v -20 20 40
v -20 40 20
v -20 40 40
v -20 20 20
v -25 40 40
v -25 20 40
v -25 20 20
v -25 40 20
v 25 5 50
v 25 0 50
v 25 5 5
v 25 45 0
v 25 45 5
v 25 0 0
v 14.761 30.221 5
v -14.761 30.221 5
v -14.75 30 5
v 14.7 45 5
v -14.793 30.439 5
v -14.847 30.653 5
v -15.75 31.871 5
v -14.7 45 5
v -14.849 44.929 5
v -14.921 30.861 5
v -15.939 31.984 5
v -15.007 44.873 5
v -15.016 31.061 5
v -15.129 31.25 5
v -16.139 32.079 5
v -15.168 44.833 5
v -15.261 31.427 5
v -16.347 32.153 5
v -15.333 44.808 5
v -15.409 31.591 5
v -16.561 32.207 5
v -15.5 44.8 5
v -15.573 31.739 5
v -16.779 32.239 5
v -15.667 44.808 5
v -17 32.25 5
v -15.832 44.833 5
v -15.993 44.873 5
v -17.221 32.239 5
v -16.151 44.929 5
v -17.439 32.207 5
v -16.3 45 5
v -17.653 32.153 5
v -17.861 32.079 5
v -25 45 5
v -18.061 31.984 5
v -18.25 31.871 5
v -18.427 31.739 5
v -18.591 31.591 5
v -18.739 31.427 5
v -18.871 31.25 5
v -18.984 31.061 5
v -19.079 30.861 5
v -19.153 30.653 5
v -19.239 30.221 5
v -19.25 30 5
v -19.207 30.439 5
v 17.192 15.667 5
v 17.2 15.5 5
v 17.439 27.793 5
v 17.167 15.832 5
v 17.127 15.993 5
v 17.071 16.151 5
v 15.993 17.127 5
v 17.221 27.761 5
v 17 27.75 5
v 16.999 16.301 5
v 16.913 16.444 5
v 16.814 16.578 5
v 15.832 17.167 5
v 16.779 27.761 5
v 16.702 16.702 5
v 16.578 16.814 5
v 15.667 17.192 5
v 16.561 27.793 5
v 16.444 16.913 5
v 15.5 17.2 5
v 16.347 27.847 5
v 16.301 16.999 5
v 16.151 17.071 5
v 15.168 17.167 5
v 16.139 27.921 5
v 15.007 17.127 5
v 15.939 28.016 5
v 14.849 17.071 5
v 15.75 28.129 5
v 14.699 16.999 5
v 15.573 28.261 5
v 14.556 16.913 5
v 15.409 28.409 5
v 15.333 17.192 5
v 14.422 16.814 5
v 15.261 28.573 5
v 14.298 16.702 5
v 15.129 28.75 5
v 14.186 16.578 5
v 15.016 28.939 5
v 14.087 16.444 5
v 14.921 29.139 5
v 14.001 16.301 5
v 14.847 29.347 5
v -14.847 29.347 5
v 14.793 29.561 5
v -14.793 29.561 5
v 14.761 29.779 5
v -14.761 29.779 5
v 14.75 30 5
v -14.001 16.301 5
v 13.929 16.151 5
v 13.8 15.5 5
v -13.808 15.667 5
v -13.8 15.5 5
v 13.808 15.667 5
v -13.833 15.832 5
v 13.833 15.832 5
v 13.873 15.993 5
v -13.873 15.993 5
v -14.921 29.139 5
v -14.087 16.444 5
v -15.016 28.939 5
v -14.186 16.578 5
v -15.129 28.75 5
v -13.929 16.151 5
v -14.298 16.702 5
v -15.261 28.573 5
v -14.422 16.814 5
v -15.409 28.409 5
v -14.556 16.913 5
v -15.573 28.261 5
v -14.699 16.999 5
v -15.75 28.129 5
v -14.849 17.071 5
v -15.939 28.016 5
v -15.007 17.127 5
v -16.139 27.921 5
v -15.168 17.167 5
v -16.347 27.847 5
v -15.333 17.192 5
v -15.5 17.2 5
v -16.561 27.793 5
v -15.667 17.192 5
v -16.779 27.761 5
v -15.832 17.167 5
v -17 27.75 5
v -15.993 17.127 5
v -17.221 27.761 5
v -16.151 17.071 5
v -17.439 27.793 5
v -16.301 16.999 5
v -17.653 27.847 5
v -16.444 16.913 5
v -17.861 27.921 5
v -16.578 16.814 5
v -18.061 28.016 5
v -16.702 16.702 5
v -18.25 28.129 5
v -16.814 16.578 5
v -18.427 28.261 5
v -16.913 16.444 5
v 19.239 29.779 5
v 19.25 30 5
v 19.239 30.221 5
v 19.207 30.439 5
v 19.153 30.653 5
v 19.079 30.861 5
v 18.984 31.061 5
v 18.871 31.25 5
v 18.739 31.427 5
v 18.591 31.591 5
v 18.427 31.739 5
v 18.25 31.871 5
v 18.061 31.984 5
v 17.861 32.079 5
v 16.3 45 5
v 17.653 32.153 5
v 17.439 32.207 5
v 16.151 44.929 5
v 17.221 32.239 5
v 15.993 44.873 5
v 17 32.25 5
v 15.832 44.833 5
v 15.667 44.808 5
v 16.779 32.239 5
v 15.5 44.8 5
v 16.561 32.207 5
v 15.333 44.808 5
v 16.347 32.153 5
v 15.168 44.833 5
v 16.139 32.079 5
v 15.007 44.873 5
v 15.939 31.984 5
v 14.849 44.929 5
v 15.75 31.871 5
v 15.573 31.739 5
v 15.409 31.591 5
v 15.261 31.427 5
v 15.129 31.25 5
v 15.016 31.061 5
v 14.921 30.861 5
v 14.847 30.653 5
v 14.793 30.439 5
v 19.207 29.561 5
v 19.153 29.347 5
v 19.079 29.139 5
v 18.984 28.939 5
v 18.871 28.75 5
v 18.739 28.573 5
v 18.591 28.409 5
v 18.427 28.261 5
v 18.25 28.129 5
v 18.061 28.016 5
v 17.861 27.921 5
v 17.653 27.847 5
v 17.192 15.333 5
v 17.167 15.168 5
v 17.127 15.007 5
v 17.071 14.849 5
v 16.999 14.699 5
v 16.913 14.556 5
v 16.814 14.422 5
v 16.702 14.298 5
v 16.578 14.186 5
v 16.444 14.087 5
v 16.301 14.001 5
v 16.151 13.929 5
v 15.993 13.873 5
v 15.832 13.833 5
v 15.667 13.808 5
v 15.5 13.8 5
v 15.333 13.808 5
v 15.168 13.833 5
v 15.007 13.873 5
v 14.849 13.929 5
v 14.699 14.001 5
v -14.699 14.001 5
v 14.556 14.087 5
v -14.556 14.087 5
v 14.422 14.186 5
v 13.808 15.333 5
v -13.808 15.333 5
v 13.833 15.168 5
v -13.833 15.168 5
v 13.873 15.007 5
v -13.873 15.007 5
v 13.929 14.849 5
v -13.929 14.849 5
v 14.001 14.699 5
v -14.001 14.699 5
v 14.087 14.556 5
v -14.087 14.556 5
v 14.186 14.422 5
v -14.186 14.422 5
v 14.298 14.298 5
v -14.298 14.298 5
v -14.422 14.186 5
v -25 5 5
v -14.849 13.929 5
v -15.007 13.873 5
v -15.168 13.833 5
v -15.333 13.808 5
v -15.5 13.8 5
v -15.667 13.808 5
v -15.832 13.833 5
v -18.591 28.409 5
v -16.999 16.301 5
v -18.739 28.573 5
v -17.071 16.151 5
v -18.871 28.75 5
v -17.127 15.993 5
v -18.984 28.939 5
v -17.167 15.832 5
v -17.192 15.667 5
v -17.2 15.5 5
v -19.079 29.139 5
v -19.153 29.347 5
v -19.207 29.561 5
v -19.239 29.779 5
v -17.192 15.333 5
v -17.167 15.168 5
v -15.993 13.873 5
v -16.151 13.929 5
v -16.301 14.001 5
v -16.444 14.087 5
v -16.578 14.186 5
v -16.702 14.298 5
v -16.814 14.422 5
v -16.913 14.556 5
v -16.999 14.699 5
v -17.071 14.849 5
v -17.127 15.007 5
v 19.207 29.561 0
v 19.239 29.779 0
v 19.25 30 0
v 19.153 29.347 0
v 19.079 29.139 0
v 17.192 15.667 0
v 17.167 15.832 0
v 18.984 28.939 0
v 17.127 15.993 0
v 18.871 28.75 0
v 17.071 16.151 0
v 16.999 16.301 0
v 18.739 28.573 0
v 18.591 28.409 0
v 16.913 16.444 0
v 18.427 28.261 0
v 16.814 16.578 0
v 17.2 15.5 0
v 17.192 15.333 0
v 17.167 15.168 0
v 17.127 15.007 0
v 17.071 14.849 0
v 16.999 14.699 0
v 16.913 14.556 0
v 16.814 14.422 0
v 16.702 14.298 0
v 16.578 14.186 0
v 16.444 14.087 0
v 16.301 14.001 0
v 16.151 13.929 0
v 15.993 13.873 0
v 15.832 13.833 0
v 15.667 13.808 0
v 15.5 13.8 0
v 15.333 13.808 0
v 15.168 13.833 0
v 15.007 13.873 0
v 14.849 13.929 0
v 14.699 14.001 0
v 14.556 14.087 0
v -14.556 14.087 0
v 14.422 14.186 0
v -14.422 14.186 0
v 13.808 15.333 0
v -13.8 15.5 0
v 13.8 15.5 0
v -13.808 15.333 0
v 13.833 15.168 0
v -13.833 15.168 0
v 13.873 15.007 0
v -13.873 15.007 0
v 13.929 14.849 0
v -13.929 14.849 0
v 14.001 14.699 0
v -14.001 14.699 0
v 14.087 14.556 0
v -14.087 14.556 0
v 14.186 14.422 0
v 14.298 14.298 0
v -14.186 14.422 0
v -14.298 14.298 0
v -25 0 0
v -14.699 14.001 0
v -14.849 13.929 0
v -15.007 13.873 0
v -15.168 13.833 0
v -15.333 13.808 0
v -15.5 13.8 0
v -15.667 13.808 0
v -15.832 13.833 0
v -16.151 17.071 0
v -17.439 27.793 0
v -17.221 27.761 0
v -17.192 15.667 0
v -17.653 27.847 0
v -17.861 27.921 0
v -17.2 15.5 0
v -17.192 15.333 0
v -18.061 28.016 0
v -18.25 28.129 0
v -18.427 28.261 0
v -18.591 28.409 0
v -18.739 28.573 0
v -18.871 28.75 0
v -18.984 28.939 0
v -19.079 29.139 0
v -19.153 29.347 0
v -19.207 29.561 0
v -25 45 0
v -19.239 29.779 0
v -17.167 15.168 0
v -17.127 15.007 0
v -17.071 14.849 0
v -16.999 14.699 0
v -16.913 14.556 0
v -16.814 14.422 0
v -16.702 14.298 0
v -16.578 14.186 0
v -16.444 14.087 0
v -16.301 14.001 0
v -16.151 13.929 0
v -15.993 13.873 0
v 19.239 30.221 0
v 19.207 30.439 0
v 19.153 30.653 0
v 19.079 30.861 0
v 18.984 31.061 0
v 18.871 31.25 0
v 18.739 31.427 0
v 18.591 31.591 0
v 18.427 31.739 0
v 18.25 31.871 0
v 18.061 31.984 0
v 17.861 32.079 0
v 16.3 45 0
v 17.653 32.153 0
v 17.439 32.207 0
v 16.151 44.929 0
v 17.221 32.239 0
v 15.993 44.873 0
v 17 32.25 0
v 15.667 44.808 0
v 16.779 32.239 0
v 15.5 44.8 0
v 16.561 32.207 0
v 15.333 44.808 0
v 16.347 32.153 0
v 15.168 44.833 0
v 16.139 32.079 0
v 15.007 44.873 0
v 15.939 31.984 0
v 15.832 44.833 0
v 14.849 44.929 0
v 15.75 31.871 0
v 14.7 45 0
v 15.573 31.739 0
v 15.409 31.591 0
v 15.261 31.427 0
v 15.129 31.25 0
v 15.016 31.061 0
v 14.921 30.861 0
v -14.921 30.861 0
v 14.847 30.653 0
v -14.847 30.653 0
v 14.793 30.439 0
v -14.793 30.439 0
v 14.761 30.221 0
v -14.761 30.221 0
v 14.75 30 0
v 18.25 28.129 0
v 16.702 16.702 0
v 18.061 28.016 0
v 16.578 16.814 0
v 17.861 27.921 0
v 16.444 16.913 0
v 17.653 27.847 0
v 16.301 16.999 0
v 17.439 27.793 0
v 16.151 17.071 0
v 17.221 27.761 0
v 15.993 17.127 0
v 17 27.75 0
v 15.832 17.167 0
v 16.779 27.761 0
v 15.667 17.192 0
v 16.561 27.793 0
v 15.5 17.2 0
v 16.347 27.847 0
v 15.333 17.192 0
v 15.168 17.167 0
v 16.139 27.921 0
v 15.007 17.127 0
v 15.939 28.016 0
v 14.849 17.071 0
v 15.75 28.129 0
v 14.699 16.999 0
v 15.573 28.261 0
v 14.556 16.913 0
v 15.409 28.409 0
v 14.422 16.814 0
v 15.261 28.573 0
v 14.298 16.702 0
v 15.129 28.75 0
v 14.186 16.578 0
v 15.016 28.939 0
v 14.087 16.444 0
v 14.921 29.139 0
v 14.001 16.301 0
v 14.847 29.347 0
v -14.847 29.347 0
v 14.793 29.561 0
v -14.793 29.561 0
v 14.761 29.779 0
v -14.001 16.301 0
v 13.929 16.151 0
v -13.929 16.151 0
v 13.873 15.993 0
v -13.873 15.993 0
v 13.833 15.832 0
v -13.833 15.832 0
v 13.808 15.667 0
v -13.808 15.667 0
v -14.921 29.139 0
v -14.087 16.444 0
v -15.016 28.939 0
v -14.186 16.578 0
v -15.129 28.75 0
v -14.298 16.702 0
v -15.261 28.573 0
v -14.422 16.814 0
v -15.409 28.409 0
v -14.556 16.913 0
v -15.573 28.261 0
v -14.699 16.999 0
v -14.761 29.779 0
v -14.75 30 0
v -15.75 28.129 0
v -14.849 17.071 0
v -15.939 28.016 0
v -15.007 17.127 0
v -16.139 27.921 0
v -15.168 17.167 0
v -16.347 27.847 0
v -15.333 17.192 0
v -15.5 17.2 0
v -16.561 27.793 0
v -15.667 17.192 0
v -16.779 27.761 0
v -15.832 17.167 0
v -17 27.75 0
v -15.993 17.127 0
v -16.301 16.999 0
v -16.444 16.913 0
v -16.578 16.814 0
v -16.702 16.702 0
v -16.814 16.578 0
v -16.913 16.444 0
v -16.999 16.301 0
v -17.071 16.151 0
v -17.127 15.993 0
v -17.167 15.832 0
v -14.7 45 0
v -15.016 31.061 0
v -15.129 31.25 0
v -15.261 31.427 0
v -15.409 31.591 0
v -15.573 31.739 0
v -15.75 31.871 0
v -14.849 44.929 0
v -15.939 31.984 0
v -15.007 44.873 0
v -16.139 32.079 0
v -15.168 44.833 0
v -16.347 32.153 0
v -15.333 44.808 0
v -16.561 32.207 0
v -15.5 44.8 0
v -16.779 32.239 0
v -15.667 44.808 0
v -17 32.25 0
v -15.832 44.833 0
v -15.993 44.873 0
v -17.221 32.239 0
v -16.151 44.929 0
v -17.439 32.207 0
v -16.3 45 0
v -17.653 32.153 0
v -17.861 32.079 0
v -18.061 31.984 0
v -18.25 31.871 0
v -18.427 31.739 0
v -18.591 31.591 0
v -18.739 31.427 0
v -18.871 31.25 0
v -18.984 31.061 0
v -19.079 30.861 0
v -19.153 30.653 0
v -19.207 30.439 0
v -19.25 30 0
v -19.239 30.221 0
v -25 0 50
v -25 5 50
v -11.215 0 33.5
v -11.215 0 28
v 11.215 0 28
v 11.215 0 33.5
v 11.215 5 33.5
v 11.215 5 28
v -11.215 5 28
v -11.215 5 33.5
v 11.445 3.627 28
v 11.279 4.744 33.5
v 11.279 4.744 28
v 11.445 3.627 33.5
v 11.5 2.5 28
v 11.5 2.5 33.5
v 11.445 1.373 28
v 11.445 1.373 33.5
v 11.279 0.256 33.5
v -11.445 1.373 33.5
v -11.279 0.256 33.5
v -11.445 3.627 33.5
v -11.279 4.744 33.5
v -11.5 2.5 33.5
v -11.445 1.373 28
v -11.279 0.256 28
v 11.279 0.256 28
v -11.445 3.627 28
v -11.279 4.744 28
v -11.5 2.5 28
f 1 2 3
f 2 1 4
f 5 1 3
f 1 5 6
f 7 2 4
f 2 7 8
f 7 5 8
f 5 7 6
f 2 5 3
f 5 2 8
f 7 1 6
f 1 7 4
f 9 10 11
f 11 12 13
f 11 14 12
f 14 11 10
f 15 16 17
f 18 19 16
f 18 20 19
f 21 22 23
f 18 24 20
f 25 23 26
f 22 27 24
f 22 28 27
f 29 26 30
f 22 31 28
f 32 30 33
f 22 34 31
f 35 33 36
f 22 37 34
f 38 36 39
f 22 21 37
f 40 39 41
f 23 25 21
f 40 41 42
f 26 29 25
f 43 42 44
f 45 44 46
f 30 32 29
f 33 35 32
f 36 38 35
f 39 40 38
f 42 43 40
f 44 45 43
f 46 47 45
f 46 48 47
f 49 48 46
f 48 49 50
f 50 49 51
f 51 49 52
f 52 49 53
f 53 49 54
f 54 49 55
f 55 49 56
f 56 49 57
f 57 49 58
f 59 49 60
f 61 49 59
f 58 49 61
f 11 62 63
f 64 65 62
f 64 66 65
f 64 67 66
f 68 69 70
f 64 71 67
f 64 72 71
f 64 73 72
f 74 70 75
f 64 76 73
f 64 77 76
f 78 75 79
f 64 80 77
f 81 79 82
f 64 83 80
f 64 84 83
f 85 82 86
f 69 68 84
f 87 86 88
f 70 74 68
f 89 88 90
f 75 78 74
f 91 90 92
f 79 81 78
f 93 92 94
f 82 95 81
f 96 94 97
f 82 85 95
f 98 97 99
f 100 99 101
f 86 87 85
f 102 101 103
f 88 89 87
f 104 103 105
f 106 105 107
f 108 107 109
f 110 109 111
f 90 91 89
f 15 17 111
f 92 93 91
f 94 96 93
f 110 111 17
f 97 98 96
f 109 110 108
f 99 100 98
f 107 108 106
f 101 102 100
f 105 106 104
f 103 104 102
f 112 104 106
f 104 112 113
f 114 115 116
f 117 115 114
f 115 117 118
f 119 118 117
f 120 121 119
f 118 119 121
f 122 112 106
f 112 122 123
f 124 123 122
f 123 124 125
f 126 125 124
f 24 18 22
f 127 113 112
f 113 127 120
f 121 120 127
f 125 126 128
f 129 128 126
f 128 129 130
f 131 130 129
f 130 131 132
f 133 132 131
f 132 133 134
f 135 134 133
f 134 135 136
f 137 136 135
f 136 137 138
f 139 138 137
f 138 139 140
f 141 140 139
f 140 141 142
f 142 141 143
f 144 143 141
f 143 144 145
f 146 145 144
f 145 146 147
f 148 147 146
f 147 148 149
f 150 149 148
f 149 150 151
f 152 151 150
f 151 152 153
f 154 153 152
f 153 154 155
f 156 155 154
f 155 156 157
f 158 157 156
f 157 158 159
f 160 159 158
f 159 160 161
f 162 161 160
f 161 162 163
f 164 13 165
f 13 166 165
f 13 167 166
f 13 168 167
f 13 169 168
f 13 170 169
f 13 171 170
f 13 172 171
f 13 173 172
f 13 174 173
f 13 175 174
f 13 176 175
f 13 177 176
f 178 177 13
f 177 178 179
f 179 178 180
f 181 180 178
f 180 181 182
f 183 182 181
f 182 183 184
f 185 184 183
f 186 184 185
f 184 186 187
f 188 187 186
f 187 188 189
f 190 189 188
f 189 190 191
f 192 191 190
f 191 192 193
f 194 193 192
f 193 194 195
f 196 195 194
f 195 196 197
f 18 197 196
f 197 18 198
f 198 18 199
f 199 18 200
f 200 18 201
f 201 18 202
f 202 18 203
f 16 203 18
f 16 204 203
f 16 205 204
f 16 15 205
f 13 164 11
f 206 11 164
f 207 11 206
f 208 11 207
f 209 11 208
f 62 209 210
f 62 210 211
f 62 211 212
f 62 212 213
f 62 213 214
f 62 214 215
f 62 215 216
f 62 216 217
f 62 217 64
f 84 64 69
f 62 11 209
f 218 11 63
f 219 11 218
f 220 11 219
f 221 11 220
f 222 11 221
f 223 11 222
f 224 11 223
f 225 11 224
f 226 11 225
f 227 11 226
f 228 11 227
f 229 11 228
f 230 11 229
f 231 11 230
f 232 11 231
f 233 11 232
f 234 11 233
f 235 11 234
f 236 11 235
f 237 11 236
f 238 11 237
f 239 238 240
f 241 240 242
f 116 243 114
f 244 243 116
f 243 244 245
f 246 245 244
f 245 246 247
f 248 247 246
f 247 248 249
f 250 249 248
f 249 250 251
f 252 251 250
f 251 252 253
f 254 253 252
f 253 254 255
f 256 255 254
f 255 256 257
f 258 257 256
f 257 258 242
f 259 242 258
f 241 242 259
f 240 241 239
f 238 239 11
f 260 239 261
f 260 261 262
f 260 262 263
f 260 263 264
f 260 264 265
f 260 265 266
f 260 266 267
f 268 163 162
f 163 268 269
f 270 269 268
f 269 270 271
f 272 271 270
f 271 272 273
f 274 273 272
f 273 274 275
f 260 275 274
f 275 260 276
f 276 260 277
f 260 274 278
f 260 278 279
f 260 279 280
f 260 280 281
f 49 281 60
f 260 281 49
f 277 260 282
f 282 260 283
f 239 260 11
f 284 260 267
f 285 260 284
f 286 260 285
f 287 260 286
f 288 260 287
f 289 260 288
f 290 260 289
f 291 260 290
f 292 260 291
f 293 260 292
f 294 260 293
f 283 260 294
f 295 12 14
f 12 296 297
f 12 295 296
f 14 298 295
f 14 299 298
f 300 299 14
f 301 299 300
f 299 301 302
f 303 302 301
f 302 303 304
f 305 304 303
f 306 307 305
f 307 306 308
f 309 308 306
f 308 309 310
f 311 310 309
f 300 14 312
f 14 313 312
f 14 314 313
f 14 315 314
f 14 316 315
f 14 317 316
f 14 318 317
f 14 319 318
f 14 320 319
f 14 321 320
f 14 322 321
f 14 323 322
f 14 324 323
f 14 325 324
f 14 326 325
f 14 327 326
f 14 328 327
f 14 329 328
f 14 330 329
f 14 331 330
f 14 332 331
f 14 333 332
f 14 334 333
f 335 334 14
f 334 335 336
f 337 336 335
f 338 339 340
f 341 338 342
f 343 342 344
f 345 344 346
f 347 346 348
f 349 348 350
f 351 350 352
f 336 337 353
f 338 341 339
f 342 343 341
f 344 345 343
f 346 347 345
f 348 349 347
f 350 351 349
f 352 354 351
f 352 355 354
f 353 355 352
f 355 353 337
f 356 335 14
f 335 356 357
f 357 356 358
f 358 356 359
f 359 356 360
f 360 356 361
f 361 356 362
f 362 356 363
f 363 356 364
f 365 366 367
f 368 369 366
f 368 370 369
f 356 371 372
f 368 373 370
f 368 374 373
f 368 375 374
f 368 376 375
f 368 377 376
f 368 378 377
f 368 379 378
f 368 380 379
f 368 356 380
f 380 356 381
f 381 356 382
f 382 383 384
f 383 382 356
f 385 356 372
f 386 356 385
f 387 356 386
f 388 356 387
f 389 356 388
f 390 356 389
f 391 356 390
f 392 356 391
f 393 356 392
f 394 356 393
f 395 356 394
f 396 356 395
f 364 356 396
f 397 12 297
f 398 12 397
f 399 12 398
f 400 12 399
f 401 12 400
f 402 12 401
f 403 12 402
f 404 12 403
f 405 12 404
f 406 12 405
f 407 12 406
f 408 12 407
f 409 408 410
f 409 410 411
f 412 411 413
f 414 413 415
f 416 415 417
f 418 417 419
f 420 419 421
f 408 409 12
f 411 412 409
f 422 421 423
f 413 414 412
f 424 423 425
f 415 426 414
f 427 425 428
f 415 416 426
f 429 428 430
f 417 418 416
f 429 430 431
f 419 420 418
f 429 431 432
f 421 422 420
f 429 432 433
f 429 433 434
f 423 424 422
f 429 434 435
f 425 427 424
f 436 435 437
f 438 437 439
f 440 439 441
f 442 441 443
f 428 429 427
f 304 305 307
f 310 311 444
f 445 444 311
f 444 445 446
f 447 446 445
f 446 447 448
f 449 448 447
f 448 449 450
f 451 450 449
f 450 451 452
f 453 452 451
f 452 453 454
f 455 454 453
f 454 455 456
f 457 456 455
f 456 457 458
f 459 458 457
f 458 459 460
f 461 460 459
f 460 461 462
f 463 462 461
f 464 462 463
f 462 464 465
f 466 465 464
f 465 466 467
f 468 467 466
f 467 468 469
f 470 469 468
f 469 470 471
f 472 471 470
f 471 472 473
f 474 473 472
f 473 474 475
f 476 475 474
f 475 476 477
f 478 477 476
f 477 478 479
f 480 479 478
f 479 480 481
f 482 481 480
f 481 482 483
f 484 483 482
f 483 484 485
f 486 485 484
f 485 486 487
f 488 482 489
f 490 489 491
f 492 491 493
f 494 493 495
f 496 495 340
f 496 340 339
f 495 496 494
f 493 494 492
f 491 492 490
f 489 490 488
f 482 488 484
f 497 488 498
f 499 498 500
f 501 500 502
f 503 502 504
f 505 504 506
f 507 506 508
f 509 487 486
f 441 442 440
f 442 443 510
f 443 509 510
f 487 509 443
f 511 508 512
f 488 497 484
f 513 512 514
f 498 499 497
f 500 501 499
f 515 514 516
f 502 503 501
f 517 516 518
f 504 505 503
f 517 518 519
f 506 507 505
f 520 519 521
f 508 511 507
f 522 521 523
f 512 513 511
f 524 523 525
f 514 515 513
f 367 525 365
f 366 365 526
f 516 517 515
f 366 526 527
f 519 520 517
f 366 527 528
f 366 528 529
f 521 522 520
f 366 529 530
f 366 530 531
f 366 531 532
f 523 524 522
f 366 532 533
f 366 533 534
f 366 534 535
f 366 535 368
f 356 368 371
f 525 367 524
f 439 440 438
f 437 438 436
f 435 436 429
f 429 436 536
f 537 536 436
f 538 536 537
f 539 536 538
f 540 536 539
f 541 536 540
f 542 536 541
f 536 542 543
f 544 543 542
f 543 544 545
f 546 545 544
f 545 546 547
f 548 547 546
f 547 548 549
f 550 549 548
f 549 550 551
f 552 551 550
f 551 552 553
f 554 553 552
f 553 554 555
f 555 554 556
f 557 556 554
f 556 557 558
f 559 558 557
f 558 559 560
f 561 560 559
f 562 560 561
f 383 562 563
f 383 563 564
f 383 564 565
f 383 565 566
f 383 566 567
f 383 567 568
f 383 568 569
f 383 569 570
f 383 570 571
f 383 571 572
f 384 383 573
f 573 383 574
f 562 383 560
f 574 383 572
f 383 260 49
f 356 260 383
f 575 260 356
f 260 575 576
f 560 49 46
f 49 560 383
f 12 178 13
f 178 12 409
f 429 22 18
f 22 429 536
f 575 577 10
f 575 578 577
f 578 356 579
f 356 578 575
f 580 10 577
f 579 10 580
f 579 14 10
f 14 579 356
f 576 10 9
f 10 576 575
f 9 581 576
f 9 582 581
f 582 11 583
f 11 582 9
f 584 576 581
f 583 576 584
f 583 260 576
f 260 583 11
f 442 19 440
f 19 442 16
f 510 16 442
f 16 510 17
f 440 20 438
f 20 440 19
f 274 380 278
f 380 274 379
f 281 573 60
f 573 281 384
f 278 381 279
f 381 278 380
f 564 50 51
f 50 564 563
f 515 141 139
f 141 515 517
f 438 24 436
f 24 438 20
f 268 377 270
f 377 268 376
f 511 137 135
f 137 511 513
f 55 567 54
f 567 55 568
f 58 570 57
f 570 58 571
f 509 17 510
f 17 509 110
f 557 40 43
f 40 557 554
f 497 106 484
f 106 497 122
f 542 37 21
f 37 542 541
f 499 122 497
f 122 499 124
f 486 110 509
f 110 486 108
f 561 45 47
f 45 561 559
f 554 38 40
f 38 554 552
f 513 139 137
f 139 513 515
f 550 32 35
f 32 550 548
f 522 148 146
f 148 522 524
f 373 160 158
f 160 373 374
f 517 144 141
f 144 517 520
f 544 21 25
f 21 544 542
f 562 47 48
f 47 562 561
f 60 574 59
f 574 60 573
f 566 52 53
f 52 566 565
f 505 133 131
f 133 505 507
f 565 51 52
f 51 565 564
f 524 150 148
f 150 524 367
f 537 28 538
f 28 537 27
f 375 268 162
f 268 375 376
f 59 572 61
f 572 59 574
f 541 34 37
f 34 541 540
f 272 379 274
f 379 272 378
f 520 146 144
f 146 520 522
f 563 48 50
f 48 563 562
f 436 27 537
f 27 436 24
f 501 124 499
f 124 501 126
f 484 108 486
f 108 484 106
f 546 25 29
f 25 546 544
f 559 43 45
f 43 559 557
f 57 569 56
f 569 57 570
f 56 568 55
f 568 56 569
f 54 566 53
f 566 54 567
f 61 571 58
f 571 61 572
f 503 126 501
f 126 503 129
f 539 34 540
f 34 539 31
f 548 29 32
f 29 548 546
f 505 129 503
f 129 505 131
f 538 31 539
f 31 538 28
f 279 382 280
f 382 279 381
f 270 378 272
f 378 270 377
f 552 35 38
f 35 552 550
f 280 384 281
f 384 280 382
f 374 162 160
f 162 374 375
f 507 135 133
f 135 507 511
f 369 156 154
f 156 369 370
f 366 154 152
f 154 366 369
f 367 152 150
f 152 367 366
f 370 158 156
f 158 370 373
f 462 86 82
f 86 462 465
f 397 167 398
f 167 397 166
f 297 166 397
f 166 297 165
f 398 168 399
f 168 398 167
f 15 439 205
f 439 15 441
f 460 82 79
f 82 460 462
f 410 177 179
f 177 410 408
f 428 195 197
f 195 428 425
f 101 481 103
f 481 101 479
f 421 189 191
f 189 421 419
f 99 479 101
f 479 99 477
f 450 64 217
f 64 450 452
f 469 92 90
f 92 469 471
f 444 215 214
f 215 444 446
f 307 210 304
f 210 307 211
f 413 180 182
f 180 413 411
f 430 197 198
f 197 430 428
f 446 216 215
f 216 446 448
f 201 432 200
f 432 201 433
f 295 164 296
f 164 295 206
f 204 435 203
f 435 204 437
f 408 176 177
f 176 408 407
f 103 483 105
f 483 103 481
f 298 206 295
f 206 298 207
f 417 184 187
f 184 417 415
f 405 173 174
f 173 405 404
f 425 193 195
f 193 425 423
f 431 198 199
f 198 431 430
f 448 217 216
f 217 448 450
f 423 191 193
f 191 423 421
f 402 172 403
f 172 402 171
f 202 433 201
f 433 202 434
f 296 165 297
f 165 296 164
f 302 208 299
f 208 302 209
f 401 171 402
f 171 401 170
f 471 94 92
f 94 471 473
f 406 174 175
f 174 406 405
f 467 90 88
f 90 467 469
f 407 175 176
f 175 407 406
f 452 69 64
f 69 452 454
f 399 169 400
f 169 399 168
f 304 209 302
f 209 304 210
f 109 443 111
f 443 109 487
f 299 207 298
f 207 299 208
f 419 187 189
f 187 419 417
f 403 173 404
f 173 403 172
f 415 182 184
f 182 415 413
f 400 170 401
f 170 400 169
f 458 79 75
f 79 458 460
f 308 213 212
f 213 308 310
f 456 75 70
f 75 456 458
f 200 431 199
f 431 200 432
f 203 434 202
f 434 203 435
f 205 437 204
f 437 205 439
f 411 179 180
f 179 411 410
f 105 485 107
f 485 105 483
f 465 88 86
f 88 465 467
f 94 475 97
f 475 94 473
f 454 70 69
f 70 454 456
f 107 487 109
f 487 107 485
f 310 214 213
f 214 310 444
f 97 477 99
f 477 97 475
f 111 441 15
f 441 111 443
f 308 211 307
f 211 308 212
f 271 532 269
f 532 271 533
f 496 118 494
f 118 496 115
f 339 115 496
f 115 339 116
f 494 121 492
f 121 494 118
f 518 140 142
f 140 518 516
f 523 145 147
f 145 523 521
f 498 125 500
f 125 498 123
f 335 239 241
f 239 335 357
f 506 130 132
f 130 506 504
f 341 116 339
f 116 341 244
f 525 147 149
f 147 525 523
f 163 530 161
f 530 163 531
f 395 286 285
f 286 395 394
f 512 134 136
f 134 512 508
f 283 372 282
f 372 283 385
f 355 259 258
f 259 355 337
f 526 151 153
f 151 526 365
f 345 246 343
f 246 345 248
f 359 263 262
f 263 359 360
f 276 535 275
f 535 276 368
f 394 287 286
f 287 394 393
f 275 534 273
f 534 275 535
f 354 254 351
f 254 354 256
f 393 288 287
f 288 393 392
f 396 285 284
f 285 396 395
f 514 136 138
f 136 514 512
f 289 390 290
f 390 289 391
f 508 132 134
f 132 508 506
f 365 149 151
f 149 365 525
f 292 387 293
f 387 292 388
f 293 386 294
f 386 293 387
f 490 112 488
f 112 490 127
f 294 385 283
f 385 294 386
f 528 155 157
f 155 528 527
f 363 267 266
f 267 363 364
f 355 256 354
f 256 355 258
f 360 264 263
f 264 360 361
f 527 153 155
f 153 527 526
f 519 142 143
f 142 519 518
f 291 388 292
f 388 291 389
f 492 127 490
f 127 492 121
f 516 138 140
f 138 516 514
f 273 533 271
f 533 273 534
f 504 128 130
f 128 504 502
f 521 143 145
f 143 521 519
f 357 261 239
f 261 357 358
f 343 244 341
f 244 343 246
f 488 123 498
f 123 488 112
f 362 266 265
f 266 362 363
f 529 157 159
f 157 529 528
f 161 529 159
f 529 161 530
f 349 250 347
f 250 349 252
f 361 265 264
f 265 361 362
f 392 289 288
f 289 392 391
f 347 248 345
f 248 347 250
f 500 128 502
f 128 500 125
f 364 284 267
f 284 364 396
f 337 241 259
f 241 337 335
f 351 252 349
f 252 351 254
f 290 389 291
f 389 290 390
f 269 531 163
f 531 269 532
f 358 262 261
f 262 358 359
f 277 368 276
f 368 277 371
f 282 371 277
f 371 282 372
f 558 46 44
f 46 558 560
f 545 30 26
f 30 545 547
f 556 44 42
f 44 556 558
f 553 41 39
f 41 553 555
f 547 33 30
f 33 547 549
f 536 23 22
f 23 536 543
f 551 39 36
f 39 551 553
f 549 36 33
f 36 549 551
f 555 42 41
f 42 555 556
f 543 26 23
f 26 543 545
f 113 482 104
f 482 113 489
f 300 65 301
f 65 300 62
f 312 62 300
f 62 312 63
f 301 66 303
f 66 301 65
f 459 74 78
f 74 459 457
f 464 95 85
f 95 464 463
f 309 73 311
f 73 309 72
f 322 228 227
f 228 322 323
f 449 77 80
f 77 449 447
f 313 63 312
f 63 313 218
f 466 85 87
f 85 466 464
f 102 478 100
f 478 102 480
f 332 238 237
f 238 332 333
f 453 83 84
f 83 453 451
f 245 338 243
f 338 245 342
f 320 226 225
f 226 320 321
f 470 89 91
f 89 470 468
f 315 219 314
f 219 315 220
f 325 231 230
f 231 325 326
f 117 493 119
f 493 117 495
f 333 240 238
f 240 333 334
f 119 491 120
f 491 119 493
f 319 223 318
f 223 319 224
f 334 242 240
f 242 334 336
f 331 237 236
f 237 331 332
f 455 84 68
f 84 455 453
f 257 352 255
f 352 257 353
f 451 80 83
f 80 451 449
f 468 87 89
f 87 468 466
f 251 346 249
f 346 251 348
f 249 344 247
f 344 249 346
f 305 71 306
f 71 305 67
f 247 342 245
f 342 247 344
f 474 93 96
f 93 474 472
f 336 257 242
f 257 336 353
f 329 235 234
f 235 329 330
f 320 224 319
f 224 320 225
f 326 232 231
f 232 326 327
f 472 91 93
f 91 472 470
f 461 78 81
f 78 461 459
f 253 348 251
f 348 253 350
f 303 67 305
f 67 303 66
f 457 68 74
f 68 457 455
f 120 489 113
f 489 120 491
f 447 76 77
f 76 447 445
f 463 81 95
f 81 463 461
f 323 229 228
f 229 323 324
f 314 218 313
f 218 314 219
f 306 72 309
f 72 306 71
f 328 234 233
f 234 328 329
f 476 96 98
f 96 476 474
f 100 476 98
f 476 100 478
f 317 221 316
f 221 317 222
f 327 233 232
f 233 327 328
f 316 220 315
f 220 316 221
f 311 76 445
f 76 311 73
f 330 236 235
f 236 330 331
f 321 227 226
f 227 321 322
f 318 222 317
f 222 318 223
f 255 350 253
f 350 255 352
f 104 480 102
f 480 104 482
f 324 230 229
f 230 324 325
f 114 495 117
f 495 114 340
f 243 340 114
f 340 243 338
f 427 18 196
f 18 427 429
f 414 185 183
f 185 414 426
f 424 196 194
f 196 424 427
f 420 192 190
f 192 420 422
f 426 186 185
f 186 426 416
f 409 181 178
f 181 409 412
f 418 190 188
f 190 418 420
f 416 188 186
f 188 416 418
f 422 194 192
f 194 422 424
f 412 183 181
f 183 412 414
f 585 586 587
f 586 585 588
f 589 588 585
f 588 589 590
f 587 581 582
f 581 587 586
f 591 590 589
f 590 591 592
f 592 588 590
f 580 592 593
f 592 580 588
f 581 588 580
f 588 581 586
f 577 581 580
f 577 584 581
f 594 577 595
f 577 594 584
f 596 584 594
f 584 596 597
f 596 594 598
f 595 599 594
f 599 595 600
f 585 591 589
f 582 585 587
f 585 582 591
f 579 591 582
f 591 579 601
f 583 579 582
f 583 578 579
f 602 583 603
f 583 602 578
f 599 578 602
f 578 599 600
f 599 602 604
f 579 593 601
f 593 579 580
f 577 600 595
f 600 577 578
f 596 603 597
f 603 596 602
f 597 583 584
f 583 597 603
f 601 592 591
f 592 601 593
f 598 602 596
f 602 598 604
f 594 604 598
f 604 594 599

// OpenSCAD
// L-shaped mounting bracket for NEMA 17 stepper motor
// Print orientation: base plate on bed (z = 0), motor plate builds upward (+Z)

// ---------- Parameters ----------
base_x0      = -25;   // base plate x start
base_x1      = 25;    // base plate x end
base_y0      = 0;     // base plate y start
base_y1      = 45;    // base plate y end
base_z1      = 5;     // base plate top z

motor_x0     = -25;   // motor plate x start
motor_x1     = 25;    // motor plate x end
motor_y0     = 0;     // motor plate y start
motor_y1     = 5;     // motor plate top y (z = 0..50)
motor_z1     = 50;    // motor plate height

hole_m4_x    = -17;   // M4 hole x positions
hole_m4_y    = 30;    // M4 hole y position
hole_m4_d    = 4.5;   // M4 hole diameter

hole_boss_d  = 23;    // motor centring boss hole diameter
hole_boss_x  = 0;     // boss hole x centre
hole_boss_z  = 28;    // boss hole z centre

hole_m3_d    = 3.4;   // M3 screw hole diameter
hole_m3_p    = 31;    // square pattern side length
hole_m3_n    = 4;     // number of screw holes

gusset_t     = 5;     // gusset thickness (x)
gusset_leg   = 20;    // right triangle leg length (y and z)
gusset_x0    = -25;   // gusset left edge x
gusset_x1    = -20;   // gusset right edge x

eps          = 0.5;   // cutter overshoot past faces

$fn = 64;

// ---------- Model ----------
difference() {
    union() {
        // Base plate
        translate([base_x0, base_y0, 0])
            cube([base_x1 - base_x0, base_y1 - base_y0, base_z1]);

        // Vertical motor plate
        translate([motor_x0, motor_y0, 0])
            cube([motor_x1 - motor_x0, motor_y1, motor_z1]);

        // Gussets, flush with left and right edges
        for (sx = [-1, 1])
            translate([gusset_x0, gusset_leg, gusset_leg])
                cube([gusset_t, gusset_leg, gusset_leg]);
    }

    // M4 through-holes
    for (x = [hole_m4_x, -hole_m4_x])
        translate([x, hole_m4_y, -eps])
            cylinder(d = hole_m4_d, h = base_z1 + motor_y1 + 2 * eps);

    // Boss hole
    translate([hole_boss_x, motor_y1 / 2, hole_boss_z])
        cylinder(d = hole_boss_d, h = motor_y1 + eps);

    // M3 screw holes on square pattern
    for (i = [0 : hole_m3_n - 1])
        for (j = [0 : hole_m3_n - 1])
            translate([(i - (hole_m3_n - 1) / 2) * hole_m3_p,
                       (j - (hole_m3_n - 1) / 2) * hole_m3_p,
                       -eps])
                cylinder(d = hole_m3_d, h = base_z1 + motor_y1 + 2 * eps);
}
